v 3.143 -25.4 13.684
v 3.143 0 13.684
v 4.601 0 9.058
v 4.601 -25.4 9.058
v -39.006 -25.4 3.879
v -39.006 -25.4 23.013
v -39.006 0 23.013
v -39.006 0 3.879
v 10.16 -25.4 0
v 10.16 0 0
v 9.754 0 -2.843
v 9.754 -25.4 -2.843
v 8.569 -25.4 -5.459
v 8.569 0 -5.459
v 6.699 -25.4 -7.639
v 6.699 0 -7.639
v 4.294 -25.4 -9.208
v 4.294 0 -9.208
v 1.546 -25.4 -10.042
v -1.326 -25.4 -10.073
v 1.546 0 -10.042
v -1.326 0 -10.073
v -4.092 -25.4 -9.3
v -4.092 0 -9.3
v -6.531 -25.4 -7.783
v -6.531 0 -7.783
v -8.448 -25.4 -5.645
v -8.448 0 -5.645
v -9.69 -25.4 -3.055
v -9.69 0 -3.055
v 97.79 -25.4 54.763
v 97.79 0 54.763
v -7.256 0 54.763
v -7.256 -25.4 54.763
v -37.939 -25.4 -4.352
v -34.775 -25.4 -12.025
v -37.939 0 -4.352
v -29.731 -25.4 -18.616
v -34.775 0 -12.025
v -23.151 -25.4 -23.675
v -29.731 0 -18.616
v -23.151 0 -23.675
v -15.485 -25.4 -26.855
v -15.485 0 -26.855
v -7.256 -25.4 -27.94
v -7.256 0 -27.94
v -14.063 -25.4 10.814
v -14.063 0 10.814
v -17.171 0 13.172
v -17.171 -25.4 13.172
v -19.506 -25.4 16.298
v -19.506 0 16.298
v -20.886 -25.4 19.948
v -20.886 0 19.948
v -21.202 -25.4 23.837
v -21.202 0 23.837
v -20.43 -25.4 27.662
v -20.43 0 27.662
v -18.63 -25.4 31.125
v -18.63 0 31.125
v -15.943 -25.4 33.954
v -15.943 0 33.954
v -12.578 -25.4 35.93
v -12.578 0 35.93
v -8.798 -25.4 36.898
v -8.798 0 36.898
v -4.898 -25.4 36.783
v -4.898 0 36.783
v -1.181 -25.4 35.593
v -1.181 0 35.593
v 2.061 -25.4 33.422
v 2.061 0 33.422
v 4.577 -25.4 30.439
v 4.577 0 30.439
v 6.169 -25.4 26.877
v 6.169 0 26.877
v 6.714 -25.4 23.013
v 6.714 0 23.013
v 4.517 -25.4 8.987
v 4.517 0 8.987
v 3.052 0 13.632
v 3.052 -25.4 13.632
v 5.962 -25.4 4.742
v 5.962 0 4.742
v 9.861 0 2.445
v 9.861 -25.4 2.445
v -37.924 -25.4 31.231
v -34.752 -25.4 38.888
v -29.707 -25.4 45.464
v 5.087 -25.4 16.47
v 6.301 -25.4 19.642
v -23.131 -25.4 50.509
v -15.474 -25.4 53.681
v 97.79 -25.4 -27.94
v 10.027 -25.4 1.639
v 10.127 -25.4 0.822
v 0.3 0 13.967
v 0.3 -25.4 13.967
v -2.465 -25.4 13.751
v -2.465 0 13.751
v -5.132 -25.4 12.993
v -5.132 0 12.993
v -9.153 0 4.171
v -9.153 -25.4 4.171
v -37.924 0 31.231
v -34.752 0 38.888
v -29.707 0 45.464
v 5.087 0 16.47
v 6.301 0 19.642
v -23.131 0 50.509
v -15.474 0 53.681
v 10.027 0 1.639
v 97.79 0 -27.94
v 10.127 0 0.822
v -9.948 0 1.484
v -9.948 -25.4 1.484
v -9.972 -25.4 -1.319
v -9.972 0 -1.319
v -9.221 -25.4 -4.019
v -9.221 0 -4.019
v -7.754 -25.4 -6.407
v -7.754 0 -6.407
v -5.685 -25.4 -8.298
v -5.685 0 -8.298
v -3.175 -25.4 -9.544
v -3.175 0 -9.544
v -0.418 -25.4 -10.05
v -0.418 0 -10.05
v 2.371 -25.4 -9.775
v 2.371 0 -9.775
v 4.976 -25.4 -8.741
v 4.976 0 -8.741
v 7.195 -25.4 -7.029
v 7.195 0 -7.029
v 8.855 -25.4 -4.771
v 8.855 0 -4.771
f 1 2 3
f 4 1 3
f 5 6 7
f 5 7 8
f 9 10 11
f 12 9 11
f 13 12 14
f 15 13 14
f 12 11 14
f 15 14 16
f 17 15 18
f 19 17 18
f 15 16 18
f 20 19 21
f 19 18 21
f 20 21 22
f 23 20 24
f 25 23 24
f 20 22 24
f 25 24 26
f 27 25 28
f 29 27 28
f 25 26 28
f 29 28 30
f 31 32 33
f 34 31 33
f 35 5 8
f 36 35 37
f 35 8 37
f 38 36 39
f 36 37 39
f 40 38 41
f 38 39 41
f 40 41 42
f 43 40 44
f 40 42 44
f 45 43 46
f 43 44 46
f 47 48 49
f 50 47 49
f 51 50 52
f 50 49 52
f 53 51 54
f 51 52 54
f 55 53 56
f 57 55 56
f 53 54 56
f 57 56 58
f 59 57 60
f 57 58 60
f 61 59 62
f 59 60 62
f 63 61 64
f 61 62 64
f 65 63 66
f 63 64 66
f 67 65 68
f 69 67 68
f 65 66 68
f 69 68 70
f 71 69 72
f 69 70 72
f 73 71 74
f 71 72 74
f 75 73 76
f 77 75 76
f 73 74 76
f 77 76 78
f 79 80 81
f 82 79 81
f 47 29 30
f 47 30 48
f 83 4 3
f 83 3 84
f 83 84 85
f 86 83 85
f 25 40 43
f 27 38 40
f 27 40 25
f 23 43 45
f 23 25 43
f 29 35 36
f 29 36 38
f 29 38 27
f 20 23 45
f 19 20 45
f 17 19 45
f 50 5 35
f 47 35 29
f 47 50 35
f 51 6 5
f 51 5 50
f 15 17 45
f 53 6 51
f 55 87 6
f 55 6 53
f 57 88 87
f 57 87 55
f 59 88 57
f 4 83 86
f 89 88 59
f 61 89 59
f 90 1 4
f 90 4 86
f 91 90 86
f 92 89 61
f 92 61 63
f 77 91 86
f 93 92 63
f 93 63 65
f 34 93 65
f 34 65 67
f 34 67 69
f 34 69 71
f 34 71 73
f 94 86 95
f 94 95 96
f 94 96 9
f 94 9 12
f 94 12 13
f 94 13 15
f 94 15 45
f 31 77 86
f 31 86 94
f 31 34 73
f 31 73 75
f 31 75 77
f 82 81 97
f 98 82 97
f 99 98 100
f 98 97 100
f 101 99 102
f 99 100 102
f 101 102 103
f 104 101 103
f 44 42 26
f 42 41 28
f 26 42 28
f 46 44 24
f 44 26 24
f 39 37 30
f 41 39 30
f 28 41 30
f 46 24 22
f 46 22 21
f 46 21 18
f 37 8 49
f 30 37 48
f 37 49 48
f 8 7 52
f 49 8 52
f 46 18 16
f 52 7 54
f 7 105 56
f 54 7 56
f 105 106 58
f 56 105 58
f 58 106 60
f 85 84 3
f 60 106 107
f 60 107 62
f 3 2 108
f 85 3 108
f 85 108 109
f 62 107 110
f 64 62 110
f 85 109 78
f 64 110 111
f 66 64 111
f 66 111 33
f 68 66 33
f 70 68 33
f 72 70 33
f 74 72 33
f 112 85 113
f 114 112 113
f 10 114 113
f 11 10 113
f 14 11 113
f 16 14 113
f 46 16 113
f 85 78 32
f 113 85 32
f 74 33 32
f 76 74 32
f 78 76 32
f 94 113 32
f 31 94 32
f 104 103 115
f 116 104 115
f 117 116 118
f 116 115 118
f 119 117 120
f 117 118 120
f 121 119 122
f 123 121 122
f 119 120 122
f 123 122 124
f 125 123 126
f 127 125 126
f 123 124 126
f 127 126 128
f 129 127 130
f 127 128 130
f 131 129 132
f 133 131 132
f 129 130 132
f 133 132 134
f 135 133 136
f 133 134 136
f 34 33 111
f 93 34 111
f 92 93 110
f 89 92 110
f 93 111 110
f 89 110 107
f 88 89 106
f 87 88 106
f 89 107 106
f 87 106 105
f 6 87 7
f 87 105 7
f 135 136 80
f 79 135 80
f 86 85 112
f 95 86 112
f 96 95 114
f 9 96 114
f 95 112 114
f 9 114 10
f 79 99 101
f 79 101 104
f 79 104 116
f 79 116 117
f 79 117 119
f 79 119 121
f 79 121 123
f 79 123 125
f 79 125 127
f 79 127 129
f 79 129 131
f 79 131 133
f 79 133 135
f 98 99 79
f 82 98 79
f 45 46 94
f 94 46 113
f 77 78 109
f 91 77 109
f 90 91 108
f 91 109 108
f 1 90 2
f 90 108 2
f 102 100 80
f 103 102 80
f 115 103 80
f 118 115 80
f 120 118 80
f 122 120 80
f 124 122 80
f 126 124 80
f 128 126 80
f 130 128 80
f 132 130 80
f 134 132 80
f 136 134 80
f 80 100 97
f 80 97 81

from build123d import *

# Parameters (mm, degrees)
F2_DEPTH = 25.4
F3_DEPTH = 25.4


with BuildPart() as f2:
    # F0 (on Front) → F2 (new body)
    with BuildSketch(Plane.XZ):
        with BuildLine():
            Line((0, 54.76319), (-7.256031, 54.76319))
            ThreePointArc((-7.256031, 54.76319), (-29.706671, 45.46383), (-39.006031, 23.01319))
            Line((-39.006031, 23.01319), (-39.006031, 3.879167))
            ThreePointArc((-39.006031, 3.879167), (-29.731187, -18.616173), (-7.256106, -27.94))
            Line((-7.256106, -27.94), (0, -27.94))
            Line((0, -27.94), (97.79, -27.94))
            Line((97.79, -27.94), (97.79, 54.76319))
            Line((97.79, 54.76319), (0, 54.76319))
        make_face()
        with BuildLine():
            ThreePointArc((9.861328, 2.445365), (10.085056, 1.231768), (10.16, 0))
            ThreePointArc((10.16, 0), (1.545574, -10.041753), (-9.689764, -3.055171))
            Line((-9.689764, -3.055171), (-14.062541, 10.813505))
            ThreePointArc((-14.062541, 10.813505), (-14.329713, 35.059929), (6.713969, 23.01319))
            ThreePointArc((6.713969, 23.01319), (5.790595, 18.018548), (3.142538, 13.684167))
            Line((3.142538, 13.684167), (4.601007, 9.058495))
            ThreePointArc((4.601007, 9.058495), (7.951299, 6.324749), (9.861328, 2.445365))
        make_face(mode=Mode.SUBTRACT)
        with BuildLine():
            Line((5.961896, 4.742306), (9.861328, 2.445365))
            ThreePointArc((9.861328, 2.445365), (7.951299, 6.324749), (4.601007, 9.058495))
            Line((4.601007, 9.058495), (5.961896, 4.742306))
        make_face()
    extrude(amount=F2_DEPTH)


with BuildPart() as f3:
    # F1 (on Front) → F3 (new body)
    with BuildSketch(Plane.XZ):
        with BuildLine():
            Line((8.854894, -4.770982), (4.516981, 8.987118))
            ThreePointArc((4.516981, 8.987118), (-3.342302, 9.486855), (-9.152754, 4.171151))
            ThreePointArc((-9.152754, 4.171151), (-4.473546, -9.008818), (8.854894, -4.770982))
        make_face()
        with BuildLine():
            ThreePointArc((-9.152754, 4.171151), (-3.342302, 9.486855), (4.516981, 8.987118))
            Line((4.516981, 8.987118), (3.052306, 13.632473))
            ThreePointArc((3.052306, 13.632473), (-1.088066, 13.927563), (-5.132379, 12.993059))
            Line((-5.132379, 12.993059), (-9.152754, 4.171151))
        make_face()
    extrude(amount=F3_DEPTH)


solid = Compound([f2.part, f3.part])
